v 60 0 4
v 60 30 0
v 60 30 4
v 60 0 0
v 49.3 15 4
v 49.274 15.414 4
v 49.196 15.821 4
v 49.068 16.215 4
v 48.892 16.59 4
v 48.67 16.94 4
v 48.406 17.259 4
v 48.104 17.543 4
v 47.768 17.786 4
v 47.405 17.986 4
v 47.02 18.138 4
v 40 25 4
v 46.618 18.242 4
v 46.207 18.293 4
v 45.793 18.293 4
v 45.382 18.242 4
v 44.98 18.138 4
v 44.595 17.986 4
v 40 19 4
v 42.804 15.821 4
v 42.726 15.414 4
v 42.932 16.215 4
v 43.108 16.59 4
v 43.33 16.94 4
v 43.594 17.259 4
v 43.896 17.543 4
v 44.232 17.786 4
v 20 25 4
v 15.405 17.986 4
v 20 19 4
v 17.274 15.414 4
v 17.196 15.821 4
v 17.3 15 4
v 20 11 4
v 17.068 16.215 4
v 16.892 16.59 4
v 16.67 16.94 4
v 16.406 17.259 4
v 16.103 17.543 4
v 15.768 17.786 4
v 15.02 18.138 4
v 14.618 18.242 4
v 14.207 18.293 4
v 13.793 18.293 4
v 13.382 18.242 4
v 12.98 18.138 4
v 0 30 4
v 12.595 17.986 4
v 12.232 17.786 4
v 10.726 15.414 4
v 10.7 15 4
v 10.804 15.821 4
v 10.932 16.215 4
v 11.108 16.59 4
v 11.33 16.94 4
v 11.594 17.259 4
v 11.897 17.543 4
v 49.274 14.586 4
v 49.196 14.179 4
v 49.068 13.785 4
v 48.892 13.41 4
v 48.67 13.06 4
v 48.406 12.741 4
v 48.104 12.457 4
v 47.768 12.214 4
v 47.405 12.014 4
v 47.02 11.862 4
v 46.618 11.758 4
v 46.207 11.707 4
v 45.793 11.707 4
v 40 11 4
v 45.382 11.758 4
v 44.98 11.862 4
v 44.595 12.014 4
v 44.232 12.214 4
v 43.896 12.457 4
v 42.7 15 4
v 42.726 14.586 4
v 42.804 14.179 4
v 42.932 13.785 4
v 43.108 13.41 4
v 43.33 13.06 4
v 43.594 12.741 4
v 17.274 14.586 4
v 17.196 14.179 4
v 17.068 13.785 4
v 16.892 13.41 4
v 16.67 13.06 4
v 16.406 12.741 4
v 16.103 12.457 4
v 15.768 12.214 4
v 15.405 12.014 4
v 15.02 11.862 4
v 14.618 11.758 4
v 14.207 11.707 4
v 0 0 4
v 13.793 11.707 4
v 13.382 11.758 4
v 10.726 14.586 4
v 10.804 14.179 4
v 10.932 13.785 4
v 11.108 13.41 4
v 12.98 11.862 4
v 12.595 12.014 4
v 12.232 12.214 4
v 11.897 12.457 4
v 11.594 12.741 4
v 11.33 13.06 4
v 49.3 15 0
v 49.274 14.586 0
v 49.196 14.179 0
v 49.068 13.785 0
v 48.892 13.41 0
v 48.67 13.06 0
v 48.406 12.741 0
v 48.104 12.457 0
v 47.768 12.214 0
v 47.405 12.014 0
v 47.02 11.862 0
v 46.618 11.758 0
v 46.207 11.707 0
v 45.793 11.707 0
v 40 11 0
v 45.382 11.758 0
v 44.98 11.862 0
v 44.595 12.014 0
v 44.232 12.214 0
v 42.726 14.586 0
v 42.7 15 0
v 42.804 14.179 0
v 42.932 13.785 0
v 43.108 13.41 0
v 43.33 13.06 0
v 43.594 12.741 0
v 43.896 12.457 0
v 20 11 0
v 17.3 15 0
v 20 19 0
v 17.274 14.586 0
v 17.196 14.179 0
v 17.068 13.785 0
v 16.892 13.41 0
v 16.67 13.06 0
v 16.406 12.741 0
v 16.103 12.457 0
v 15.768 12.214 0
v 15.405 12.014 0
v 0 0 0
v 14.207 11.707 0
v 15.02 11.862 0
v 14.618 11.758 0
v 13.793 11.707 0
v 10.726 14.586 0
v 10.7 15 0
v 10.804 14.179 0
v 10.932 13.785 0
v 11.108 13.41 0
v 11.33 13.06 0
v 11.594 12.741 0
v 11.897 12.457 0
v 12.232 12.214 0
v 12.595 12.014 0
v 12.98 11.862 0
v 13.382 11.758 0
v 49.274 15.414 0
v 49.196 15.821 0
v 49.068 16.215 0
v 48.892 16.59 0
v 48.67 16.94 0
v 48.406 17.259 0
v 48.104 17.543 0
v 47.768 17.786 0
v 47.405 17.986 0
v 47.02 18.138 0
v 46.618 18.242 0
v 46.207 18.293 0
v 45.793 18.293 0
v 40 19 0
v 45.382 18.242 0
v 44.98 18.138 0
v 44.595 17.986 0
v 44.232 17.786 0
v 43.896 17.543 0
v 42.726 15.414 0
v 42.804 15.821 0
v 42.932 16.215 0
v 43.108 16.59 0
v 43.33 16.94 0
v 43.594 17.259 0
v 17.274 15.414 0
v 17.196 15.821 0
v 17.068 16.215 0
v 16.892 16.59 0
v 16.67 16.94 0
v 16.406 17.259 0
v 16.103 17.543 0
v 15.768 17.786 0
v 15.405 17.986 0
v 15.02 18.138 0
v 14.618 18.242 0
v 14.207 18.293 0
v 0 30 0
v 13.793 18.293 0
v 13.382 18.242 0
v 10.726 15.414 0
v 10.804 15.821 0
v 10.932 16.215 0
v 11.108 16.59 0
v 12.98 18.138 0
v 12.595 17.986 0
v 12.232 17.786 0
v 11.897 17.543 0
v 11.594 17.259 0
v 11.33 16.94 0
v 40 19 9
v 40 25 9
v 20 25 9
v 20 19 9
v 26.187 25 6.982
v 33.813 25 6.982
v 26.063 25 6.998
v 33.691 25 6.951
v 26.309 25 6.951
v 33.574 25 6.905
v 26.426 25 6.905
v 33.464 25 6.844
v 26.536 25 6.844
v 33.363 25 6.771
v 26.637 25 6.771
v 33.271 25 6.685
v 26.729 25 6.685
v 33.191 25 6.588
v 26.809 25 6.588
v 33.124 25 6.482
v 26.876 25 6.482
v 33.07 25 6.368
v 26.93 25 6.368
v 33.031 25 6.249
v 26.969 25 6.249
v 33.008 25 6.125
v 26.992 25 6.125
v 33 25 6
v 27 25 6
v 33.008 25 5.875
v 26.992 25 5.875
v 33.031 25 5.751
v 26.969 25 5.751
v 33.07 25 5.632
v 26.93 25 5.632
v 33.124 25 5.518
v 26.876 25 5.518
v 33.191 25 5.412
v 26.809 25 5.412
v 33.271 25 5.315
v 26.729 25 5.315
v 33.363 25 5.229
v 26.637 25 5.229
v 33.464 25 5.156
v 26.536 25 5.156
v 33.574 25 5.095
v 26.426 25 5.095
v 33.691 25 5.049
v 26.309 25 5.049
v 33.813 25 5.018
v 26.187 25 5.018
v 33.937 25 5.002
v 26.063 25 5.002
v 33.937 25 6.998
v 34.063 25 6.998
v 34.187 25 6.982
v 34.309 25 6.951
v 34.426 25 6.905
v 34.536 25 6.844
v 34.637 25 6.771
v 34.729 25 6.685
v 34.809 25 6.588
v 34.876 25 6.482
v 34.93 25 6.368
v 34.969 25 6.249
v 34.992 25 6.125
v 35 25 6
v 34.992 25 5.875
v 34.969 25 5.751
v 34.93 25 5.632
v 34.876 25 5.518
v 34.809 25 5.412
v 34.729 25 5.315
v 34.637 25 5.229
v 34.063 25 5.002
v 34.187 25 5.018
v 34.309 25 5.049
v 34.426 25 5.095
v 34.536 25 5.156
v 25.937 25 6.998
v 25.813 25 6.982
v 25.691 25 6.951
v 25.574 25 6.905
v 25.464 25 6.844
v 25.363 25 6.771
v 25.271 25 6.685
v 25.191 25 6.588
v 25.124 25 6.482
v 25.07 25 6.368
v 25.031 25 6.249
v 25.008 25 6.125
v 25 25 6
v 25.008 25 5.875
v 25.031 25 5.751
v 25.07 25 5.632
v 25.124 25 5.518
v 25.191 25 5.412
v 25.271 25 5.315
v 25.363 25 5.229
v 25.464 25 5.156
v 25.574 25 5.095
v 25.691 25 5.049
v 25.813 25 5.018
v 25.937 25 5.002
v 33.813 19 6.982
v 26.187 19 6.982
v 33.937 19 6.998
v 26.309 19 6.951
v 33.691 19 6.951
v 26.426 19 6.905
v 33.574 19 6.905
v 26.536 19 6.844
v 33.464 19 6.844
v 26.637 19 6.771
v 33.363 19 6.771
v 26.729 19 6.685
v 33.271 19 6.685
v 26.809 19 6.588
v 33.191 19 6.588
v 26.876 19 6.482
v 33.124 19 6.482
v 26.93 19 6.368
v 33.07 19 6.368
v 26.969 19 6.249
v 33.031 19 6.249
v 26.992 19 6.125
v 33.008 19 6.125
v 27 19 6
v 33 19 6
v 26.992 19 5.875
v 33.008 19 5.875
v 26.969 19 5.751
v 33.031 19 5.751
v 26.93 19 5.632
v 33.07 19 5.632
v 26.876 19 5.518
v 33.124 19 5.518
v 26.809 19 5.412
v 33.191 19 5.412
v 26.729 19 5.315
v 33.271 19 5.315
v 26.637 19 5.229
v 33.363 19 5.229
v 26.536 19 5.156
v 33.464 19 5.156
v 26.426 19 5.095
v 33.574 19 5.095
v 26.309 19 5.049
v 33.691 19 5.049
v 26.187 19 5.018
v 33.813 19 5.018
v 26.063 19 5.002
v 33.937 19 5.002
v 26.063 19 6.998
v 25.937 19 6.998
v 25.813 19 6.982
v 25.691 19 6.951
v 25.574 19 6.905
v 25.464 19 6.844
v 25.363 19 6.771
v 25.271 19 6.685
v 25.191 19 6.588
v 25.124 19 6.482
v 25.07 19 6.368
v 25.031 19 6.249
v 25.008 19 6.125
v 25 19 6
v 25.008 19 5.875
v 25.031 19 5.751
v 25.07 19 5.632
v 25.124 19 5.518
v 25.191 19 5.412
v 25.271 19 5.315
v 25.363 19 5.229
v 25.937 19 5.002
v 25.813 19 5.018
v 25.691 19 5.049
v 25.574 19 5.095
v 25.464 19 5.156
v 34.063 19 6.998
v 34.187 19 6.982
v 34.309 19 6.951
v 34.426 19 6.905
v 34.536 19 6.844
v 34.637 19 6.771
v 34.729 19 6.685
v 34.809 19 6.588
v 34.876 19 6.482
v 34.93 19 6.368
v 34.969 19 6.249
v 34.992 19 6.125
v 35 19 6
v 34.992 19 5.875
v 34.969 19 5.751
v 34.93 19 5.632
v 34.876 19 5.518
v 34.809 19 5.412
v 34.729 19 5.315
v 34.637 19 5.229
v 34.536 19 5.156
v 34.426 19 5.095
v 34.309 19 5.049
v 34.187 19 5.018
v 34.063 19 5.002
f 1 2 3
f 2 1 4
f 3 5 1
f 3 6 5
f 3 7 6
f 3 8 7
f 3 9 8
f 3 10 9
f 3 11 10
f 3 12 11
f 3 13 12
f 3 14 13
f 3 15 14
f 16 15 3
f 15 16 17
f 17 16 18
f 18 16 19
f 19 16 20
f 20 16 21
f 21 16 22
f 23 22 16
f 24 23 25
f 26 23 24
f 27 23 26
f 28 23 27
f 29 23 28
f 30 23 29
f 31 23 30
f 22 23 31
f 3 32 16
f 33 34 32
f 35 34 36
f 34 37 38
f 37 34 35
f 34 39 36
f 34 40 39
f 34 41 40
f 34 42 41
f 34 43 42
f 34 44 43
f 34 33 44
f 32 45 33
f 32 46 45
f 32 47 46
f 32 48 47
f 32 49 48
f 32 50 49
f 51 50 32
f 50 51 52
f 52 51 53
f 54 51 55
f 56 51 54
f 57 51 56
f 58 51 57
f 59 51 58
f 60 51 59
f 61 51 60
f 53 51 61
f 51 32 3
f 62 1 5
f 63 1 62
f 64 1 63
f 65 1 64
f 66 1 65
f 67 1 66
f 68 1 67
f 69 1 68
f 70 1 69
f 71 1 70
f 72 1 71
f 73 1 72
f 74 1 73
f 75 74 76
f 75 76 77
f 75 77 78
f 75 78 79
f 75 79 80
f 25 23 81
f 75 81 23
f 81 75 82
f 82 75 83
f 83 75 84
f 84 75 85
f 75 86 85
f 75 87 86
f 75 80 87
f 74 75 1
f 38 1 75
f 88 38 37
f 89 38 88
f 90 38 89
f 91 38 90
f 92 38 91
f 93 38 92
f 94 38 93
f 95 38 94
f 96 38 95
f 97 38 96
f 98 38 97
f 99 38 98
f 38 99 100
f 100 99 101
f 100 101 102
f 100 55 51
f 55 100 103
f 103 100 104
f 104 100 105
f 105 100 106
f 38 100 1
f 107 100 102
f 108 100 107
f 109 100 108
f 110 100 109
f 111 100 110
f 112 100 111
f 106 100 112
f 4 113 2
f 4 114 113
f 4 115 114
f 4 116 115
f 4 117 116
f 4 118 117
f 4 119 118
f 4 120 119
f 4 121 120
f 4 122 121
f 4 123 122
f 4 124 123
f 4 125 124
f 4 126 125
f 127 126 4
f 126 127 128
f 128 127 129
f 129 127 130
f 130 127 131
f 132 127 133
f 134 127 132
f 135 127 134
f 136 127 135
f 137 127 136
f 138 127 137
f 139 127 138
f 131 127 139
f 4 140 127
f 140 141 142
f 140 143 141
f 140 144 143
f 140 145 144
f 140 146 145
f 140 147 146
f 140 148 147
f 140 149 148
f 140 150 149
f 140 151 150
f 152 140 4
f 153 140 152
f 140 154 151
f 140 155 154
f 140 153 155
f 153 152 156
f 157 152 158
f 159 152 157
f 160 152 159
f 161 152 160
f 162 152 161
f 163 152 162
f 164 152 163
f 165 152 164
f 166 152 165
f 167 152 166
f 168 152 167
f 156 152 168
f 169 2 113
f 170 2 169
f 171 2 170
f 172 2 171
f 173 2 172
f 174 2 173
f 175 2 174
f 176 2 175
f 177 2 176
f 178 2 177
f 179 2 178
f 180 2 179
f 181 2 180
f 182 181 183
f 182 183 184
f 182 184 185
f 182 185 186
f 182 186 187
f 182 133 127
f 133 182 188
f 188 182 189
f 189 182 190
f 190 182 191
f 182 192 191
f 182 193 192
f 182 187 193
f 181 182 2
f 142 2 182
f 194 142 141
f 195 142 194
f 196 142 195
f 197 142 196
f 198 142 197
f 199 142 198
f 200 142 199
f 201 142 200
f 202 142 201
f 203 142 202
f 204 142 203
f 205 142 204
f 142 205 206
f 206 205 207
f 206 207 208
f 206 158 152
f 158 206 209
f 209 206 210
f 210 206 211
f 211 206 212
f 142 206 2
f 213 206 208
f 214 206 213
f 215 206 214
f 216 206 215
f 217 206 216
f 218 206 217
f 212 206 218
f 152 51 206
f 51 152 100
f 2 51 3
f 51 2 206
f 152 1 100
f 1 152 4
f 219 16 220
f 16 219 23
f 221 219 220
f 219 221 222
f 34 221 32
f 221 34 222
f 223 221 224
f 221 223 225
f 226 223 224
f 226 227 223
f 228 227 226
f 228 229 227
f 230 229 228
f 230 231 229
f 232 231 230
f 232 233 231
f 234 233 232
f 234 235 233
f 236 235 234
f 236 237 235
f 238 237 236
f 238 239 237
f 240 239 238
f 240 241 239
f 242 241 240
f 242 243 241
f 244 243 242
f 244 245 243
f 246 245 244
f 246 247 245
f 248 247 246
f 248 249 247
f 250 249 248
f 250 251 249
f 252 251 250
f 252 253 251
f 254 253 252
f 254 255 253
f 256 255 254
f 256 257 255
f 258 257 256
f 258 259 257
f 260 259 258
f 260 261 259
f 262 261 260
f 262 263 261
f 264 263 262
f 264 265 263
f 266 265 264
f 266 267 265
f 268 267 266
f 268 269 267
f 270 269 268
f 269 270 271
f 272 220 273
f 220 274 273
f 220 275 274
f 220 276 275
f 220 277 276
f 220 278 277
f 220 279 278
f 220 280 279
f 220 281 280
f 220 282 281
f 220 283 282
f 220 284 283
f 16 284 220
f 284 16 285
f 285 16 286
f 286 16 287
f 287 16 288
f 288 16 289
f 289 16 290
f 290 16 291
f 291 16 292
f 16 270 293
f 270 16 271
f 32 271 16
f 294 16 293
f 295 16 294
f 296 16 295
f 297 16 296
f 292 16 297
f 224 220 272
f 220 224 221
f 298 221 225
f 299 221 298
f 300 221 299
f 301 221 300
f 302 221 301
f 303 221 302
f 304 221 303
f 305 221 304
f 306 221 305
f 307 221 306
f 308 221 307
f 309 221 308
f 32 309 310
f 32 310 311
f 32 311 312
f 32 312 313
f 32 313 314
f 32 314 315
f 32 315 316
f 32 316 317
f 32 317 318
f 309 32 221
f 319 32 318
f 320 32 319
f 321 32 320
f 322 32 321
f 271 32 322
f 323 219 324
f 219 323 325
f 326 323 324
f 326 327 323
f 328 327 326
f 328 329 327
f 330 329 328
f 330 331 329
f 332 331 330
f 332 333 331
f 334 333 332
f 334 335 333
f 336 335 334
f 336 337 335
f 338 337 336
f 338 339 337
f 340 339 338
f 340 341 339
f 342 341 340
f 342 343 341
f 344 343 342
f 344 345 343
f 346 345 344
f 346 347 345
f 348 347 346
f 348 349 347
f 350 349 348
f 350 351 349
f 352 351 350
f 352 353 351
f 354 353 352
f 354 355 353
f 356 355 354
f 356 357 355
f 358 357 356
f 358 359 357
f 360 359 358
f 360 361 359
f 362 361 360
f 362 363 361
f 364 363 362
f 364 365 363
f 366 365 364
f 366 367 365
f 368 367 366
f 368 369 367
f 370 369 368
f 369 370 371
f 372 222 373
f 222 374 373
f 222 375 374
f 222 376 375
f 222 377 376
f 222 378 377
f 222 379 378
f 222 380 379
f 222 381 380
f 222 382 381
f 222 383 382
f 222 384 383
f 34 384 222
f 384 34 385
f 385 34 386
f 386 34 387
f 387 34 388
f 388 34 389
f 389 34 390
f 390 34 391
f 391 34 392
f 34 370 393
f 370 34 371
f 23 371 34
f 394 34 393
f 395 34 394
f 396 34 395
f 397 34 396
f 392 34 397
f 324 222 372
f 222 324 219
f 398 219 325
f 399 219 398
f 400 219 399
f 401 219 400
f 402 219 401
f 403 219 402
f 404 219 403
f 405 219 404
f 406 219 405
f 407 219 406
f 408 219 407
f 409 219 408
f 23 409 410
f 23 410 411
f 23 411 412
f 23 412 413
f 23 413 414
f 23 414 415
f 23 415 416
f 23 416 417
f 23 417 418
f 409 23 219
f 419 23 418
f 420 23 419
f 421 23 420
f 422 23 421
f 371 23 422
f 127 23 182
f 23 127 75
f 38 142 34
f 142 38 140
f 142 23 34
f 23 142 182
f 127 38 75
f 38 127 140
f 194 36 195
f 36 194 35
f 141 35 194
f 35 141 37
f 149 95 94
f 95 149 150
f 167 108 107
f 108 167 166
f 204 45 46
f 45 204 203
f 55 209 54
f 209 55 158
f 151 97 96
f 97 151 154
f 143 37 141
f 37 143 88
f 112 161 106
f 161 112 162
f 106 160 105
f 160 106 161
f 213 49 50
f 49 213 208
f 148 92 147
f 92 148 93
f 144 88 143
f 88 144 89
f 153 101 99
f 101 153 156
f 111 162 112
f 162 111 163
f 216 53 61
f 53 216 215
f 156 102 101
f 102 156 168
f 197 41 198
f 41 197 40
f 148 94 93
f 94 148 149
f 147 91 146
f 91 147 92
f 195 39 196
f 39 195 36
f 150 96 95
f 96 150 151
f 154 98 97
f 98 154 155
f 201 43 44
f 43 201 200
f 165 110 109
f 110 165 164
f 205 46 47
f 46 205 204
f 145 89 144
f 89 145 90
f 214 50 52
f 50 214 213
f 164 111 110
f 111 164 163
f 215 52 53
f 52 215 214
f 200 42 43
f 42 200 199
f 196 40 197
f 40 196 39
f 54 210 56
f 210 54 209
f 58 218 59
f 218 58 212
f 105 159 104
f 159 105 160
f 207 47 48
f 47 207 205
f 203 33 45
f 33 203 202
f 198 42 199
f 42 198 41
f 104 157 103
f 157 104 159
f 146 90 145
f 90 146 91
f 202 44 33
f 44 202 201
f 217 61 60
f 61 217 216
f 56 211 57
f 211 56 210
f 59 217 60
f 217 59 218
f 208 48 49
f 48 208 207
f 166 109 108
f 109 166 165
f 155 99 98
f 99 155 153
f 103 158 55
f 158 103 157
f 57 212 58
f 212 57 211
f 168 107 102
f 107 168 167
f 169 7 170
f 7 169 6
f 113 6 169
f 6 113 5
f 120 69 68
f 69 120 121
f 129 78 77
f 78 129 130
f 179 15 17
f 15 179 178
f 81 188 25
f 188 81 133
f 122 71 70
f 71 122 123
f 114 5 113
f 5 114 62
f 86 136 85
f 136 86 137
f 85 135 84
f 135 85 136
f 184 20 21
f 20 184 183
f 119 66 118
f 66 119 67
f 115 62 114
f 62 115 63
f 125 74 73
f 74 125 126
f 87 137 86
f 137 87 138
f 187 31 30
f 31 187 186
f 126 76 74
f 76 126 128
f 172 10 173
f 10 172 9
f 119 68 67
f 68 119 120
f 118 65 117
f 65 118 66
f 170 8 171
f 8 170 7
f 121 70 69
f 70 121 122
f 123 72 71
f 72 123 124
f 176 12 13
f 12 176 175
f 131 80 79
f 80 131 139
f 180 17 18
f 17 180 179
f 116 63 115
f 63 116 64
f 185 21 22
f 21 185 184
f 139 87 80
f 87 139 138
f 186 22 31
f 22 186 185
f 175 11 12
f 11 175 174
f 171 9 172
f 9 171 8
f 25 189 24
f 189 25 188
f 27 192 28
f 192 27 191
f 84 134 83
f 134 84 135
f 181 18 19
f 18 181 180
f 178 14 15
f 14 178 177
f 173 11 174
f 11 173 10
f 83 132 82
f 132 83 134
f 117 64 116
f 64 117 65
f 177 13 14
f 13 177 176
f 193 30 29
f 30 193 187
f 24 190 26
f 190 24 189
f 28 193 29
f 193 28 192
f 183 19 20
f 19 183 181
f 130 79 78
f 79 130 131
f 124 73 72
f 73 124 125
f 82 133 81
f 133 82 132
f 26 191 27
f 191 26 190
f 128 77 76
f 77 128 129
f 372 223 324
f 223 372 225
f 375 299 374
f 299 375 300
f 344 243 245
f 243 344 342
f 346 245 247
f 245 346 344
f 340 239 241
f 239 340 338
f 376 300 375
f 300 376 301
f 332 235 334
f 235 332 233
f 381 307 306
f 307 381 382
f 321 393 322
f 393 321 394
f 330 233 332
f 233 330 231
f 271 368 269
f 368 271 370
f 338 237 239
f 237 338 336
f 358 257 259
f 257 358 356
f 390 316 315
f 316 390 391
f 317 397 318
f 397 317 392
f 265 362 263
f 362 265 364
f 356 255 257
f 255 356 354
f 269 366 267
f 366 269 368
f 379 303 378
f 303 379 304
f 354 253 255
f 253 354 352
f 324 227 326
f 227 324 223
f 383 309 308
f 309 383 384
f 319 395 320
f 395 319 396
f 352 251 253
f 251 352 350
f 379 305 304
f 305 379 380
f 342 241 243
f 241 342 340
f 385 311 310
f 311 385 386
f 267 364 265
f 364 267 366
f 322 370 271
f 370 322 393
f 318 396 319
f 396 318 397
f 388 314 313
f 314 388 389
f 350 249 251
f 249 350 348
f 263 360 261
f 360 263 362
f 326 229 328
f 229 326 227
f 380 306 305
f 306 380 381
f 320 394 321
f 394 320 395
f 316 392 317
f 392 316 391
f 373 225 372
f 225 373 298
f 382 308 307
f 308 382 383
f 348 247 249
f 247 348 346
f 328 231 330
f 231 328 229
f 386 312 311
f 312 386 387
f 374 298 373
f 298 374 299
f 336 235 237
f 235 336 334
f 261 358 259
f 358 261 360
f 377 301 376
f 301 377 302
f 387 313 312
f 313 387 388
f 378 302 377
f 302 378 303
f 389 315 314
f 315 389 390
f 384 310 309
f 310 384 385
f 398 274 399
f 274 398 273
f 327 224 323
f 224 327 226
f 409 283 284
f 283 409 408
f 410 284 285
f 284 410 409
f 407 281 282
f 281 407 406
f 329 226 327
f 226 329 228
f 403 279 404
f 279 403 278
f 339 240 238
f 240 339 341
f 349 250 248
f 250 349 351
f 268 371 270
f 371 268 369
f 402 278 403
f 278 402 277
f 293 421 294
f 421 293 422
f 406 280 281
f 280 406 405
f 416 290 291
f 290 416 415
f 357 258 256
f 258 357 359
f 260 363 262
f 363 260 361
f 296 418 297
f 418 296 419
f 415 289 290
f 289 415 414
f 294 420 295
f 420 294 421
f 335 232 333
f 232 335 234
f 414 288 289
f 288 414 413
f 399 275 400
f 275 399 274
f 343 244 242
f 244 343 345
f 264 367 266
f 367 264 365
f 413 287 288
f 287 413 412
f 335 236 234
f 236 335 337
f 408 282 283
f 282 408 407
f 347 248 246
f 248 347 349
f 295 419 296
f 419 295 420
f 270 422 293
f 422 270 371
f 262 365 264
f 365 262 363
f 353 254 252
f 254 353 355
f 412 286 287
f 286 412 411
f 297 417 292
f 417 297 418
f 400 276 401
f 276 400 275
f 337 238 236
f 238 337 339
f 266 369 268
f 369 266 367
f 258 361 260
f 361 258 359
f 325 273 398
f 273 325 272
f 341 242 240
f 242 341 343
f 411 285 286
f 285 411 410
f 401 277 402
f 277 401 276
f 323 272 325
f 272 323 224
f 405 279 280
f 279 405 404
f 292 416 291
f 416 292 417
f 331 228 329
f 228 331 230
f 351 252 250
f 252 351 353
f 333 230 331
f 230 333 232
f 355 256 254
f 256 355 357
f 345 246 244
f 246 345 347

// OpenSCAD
// file: serrated45_plane.scad
// serration using cubes




module serrated45_plane (pitch, length, width) {
    union () {
        for(i = [0:(length - 1)]) {
            translate([i * cos(45), 0, 0])
            rotate([0,0,45])
            cube( [pitch, pitch, width], center = true);
        }
    }
    {
        plane_length = pitch * cos(45) * 2 * length;
        translate([plane_length/2, - pitch/2 * 0.95, 0])
        cube([plane_length, pitch/2, width], center = true);
    }
}


// serrated45_plane (0.5, 80, 18);
// main file
include <serrated45_plane.scad>;

// GPU brace - bottom
// M6 screws
// 
// printing
// - 0.1 precision, gradual infill - does not work
//   0.06 precision, 80% infile - 

base_mount_cl = 32;
base_mount_screw_dia = 6;

base_width = 30;
base_length = 60;
base_thickness = 4;


male_x = 16;
male_y = 4;
male_z = 34 + base_thickness;    // add 4mm to go through the base

flange_x = 2;
flange_y = 8;
flange_z = male_z;

// mounting to base
mounting_screw_dia = 2;
mounting_screw_length = 10;
mounting_washer_dia = 5;
mounting_screw_head_dia = 4;


// flat base

// M6 mounting - by mistake
mating_screw_dia = 6;

$fn = 50;



difference () {
    {
    union () {
        // flat base
        cube([base_length, base_width, base_thickness], center = false);
        
        // mount block
        translate([base_length/2 - (male_x/2 + flange_x), base_width/2 + flange_y/2, base_thickness])
        cube([male_x + 2 * flange_x, 6, 5], center = false);
        

        }
    }
    {
        
    // hole in base plate
    translate([base_length/2 - (male_x/2 + flange_x), base_width/2 - flange_y/2, 0])
    cube([male_x + 2 * flange_x, flange_y, base_thickness], center = false);
        
    // mount to deck        
    translate([(base_length/2 - base_mount_cl/2), base_width/2, 0])
    cylinder(r = (base_mount_screw_dia/2) * 1.1, h = base_thickness, center = false);
    translate([(base_length/2 + base_mount_cl/2), base_width/2, 0])
    cylinder(r = (base_mount_screw_dia/2) * 1.1, h = base_thickness, center = false);
        
    // mount serrated to base
    translate([base_length/2 - male_x/4, base_width/2 + flange_y, base_thickness + 2])
    rotate([90,0,0])
    #cylinder(r = mounting_screw_dia/2, h = 8, center = true);
        
    translate([base_length/2 + male_x/4, base_width/2 + flange_y, base_thickness + 2])
    rotate([90,0,0])
    #cylinder(r = mounting_screw_dia/2, h = 8, center = true);
    

    }
}
